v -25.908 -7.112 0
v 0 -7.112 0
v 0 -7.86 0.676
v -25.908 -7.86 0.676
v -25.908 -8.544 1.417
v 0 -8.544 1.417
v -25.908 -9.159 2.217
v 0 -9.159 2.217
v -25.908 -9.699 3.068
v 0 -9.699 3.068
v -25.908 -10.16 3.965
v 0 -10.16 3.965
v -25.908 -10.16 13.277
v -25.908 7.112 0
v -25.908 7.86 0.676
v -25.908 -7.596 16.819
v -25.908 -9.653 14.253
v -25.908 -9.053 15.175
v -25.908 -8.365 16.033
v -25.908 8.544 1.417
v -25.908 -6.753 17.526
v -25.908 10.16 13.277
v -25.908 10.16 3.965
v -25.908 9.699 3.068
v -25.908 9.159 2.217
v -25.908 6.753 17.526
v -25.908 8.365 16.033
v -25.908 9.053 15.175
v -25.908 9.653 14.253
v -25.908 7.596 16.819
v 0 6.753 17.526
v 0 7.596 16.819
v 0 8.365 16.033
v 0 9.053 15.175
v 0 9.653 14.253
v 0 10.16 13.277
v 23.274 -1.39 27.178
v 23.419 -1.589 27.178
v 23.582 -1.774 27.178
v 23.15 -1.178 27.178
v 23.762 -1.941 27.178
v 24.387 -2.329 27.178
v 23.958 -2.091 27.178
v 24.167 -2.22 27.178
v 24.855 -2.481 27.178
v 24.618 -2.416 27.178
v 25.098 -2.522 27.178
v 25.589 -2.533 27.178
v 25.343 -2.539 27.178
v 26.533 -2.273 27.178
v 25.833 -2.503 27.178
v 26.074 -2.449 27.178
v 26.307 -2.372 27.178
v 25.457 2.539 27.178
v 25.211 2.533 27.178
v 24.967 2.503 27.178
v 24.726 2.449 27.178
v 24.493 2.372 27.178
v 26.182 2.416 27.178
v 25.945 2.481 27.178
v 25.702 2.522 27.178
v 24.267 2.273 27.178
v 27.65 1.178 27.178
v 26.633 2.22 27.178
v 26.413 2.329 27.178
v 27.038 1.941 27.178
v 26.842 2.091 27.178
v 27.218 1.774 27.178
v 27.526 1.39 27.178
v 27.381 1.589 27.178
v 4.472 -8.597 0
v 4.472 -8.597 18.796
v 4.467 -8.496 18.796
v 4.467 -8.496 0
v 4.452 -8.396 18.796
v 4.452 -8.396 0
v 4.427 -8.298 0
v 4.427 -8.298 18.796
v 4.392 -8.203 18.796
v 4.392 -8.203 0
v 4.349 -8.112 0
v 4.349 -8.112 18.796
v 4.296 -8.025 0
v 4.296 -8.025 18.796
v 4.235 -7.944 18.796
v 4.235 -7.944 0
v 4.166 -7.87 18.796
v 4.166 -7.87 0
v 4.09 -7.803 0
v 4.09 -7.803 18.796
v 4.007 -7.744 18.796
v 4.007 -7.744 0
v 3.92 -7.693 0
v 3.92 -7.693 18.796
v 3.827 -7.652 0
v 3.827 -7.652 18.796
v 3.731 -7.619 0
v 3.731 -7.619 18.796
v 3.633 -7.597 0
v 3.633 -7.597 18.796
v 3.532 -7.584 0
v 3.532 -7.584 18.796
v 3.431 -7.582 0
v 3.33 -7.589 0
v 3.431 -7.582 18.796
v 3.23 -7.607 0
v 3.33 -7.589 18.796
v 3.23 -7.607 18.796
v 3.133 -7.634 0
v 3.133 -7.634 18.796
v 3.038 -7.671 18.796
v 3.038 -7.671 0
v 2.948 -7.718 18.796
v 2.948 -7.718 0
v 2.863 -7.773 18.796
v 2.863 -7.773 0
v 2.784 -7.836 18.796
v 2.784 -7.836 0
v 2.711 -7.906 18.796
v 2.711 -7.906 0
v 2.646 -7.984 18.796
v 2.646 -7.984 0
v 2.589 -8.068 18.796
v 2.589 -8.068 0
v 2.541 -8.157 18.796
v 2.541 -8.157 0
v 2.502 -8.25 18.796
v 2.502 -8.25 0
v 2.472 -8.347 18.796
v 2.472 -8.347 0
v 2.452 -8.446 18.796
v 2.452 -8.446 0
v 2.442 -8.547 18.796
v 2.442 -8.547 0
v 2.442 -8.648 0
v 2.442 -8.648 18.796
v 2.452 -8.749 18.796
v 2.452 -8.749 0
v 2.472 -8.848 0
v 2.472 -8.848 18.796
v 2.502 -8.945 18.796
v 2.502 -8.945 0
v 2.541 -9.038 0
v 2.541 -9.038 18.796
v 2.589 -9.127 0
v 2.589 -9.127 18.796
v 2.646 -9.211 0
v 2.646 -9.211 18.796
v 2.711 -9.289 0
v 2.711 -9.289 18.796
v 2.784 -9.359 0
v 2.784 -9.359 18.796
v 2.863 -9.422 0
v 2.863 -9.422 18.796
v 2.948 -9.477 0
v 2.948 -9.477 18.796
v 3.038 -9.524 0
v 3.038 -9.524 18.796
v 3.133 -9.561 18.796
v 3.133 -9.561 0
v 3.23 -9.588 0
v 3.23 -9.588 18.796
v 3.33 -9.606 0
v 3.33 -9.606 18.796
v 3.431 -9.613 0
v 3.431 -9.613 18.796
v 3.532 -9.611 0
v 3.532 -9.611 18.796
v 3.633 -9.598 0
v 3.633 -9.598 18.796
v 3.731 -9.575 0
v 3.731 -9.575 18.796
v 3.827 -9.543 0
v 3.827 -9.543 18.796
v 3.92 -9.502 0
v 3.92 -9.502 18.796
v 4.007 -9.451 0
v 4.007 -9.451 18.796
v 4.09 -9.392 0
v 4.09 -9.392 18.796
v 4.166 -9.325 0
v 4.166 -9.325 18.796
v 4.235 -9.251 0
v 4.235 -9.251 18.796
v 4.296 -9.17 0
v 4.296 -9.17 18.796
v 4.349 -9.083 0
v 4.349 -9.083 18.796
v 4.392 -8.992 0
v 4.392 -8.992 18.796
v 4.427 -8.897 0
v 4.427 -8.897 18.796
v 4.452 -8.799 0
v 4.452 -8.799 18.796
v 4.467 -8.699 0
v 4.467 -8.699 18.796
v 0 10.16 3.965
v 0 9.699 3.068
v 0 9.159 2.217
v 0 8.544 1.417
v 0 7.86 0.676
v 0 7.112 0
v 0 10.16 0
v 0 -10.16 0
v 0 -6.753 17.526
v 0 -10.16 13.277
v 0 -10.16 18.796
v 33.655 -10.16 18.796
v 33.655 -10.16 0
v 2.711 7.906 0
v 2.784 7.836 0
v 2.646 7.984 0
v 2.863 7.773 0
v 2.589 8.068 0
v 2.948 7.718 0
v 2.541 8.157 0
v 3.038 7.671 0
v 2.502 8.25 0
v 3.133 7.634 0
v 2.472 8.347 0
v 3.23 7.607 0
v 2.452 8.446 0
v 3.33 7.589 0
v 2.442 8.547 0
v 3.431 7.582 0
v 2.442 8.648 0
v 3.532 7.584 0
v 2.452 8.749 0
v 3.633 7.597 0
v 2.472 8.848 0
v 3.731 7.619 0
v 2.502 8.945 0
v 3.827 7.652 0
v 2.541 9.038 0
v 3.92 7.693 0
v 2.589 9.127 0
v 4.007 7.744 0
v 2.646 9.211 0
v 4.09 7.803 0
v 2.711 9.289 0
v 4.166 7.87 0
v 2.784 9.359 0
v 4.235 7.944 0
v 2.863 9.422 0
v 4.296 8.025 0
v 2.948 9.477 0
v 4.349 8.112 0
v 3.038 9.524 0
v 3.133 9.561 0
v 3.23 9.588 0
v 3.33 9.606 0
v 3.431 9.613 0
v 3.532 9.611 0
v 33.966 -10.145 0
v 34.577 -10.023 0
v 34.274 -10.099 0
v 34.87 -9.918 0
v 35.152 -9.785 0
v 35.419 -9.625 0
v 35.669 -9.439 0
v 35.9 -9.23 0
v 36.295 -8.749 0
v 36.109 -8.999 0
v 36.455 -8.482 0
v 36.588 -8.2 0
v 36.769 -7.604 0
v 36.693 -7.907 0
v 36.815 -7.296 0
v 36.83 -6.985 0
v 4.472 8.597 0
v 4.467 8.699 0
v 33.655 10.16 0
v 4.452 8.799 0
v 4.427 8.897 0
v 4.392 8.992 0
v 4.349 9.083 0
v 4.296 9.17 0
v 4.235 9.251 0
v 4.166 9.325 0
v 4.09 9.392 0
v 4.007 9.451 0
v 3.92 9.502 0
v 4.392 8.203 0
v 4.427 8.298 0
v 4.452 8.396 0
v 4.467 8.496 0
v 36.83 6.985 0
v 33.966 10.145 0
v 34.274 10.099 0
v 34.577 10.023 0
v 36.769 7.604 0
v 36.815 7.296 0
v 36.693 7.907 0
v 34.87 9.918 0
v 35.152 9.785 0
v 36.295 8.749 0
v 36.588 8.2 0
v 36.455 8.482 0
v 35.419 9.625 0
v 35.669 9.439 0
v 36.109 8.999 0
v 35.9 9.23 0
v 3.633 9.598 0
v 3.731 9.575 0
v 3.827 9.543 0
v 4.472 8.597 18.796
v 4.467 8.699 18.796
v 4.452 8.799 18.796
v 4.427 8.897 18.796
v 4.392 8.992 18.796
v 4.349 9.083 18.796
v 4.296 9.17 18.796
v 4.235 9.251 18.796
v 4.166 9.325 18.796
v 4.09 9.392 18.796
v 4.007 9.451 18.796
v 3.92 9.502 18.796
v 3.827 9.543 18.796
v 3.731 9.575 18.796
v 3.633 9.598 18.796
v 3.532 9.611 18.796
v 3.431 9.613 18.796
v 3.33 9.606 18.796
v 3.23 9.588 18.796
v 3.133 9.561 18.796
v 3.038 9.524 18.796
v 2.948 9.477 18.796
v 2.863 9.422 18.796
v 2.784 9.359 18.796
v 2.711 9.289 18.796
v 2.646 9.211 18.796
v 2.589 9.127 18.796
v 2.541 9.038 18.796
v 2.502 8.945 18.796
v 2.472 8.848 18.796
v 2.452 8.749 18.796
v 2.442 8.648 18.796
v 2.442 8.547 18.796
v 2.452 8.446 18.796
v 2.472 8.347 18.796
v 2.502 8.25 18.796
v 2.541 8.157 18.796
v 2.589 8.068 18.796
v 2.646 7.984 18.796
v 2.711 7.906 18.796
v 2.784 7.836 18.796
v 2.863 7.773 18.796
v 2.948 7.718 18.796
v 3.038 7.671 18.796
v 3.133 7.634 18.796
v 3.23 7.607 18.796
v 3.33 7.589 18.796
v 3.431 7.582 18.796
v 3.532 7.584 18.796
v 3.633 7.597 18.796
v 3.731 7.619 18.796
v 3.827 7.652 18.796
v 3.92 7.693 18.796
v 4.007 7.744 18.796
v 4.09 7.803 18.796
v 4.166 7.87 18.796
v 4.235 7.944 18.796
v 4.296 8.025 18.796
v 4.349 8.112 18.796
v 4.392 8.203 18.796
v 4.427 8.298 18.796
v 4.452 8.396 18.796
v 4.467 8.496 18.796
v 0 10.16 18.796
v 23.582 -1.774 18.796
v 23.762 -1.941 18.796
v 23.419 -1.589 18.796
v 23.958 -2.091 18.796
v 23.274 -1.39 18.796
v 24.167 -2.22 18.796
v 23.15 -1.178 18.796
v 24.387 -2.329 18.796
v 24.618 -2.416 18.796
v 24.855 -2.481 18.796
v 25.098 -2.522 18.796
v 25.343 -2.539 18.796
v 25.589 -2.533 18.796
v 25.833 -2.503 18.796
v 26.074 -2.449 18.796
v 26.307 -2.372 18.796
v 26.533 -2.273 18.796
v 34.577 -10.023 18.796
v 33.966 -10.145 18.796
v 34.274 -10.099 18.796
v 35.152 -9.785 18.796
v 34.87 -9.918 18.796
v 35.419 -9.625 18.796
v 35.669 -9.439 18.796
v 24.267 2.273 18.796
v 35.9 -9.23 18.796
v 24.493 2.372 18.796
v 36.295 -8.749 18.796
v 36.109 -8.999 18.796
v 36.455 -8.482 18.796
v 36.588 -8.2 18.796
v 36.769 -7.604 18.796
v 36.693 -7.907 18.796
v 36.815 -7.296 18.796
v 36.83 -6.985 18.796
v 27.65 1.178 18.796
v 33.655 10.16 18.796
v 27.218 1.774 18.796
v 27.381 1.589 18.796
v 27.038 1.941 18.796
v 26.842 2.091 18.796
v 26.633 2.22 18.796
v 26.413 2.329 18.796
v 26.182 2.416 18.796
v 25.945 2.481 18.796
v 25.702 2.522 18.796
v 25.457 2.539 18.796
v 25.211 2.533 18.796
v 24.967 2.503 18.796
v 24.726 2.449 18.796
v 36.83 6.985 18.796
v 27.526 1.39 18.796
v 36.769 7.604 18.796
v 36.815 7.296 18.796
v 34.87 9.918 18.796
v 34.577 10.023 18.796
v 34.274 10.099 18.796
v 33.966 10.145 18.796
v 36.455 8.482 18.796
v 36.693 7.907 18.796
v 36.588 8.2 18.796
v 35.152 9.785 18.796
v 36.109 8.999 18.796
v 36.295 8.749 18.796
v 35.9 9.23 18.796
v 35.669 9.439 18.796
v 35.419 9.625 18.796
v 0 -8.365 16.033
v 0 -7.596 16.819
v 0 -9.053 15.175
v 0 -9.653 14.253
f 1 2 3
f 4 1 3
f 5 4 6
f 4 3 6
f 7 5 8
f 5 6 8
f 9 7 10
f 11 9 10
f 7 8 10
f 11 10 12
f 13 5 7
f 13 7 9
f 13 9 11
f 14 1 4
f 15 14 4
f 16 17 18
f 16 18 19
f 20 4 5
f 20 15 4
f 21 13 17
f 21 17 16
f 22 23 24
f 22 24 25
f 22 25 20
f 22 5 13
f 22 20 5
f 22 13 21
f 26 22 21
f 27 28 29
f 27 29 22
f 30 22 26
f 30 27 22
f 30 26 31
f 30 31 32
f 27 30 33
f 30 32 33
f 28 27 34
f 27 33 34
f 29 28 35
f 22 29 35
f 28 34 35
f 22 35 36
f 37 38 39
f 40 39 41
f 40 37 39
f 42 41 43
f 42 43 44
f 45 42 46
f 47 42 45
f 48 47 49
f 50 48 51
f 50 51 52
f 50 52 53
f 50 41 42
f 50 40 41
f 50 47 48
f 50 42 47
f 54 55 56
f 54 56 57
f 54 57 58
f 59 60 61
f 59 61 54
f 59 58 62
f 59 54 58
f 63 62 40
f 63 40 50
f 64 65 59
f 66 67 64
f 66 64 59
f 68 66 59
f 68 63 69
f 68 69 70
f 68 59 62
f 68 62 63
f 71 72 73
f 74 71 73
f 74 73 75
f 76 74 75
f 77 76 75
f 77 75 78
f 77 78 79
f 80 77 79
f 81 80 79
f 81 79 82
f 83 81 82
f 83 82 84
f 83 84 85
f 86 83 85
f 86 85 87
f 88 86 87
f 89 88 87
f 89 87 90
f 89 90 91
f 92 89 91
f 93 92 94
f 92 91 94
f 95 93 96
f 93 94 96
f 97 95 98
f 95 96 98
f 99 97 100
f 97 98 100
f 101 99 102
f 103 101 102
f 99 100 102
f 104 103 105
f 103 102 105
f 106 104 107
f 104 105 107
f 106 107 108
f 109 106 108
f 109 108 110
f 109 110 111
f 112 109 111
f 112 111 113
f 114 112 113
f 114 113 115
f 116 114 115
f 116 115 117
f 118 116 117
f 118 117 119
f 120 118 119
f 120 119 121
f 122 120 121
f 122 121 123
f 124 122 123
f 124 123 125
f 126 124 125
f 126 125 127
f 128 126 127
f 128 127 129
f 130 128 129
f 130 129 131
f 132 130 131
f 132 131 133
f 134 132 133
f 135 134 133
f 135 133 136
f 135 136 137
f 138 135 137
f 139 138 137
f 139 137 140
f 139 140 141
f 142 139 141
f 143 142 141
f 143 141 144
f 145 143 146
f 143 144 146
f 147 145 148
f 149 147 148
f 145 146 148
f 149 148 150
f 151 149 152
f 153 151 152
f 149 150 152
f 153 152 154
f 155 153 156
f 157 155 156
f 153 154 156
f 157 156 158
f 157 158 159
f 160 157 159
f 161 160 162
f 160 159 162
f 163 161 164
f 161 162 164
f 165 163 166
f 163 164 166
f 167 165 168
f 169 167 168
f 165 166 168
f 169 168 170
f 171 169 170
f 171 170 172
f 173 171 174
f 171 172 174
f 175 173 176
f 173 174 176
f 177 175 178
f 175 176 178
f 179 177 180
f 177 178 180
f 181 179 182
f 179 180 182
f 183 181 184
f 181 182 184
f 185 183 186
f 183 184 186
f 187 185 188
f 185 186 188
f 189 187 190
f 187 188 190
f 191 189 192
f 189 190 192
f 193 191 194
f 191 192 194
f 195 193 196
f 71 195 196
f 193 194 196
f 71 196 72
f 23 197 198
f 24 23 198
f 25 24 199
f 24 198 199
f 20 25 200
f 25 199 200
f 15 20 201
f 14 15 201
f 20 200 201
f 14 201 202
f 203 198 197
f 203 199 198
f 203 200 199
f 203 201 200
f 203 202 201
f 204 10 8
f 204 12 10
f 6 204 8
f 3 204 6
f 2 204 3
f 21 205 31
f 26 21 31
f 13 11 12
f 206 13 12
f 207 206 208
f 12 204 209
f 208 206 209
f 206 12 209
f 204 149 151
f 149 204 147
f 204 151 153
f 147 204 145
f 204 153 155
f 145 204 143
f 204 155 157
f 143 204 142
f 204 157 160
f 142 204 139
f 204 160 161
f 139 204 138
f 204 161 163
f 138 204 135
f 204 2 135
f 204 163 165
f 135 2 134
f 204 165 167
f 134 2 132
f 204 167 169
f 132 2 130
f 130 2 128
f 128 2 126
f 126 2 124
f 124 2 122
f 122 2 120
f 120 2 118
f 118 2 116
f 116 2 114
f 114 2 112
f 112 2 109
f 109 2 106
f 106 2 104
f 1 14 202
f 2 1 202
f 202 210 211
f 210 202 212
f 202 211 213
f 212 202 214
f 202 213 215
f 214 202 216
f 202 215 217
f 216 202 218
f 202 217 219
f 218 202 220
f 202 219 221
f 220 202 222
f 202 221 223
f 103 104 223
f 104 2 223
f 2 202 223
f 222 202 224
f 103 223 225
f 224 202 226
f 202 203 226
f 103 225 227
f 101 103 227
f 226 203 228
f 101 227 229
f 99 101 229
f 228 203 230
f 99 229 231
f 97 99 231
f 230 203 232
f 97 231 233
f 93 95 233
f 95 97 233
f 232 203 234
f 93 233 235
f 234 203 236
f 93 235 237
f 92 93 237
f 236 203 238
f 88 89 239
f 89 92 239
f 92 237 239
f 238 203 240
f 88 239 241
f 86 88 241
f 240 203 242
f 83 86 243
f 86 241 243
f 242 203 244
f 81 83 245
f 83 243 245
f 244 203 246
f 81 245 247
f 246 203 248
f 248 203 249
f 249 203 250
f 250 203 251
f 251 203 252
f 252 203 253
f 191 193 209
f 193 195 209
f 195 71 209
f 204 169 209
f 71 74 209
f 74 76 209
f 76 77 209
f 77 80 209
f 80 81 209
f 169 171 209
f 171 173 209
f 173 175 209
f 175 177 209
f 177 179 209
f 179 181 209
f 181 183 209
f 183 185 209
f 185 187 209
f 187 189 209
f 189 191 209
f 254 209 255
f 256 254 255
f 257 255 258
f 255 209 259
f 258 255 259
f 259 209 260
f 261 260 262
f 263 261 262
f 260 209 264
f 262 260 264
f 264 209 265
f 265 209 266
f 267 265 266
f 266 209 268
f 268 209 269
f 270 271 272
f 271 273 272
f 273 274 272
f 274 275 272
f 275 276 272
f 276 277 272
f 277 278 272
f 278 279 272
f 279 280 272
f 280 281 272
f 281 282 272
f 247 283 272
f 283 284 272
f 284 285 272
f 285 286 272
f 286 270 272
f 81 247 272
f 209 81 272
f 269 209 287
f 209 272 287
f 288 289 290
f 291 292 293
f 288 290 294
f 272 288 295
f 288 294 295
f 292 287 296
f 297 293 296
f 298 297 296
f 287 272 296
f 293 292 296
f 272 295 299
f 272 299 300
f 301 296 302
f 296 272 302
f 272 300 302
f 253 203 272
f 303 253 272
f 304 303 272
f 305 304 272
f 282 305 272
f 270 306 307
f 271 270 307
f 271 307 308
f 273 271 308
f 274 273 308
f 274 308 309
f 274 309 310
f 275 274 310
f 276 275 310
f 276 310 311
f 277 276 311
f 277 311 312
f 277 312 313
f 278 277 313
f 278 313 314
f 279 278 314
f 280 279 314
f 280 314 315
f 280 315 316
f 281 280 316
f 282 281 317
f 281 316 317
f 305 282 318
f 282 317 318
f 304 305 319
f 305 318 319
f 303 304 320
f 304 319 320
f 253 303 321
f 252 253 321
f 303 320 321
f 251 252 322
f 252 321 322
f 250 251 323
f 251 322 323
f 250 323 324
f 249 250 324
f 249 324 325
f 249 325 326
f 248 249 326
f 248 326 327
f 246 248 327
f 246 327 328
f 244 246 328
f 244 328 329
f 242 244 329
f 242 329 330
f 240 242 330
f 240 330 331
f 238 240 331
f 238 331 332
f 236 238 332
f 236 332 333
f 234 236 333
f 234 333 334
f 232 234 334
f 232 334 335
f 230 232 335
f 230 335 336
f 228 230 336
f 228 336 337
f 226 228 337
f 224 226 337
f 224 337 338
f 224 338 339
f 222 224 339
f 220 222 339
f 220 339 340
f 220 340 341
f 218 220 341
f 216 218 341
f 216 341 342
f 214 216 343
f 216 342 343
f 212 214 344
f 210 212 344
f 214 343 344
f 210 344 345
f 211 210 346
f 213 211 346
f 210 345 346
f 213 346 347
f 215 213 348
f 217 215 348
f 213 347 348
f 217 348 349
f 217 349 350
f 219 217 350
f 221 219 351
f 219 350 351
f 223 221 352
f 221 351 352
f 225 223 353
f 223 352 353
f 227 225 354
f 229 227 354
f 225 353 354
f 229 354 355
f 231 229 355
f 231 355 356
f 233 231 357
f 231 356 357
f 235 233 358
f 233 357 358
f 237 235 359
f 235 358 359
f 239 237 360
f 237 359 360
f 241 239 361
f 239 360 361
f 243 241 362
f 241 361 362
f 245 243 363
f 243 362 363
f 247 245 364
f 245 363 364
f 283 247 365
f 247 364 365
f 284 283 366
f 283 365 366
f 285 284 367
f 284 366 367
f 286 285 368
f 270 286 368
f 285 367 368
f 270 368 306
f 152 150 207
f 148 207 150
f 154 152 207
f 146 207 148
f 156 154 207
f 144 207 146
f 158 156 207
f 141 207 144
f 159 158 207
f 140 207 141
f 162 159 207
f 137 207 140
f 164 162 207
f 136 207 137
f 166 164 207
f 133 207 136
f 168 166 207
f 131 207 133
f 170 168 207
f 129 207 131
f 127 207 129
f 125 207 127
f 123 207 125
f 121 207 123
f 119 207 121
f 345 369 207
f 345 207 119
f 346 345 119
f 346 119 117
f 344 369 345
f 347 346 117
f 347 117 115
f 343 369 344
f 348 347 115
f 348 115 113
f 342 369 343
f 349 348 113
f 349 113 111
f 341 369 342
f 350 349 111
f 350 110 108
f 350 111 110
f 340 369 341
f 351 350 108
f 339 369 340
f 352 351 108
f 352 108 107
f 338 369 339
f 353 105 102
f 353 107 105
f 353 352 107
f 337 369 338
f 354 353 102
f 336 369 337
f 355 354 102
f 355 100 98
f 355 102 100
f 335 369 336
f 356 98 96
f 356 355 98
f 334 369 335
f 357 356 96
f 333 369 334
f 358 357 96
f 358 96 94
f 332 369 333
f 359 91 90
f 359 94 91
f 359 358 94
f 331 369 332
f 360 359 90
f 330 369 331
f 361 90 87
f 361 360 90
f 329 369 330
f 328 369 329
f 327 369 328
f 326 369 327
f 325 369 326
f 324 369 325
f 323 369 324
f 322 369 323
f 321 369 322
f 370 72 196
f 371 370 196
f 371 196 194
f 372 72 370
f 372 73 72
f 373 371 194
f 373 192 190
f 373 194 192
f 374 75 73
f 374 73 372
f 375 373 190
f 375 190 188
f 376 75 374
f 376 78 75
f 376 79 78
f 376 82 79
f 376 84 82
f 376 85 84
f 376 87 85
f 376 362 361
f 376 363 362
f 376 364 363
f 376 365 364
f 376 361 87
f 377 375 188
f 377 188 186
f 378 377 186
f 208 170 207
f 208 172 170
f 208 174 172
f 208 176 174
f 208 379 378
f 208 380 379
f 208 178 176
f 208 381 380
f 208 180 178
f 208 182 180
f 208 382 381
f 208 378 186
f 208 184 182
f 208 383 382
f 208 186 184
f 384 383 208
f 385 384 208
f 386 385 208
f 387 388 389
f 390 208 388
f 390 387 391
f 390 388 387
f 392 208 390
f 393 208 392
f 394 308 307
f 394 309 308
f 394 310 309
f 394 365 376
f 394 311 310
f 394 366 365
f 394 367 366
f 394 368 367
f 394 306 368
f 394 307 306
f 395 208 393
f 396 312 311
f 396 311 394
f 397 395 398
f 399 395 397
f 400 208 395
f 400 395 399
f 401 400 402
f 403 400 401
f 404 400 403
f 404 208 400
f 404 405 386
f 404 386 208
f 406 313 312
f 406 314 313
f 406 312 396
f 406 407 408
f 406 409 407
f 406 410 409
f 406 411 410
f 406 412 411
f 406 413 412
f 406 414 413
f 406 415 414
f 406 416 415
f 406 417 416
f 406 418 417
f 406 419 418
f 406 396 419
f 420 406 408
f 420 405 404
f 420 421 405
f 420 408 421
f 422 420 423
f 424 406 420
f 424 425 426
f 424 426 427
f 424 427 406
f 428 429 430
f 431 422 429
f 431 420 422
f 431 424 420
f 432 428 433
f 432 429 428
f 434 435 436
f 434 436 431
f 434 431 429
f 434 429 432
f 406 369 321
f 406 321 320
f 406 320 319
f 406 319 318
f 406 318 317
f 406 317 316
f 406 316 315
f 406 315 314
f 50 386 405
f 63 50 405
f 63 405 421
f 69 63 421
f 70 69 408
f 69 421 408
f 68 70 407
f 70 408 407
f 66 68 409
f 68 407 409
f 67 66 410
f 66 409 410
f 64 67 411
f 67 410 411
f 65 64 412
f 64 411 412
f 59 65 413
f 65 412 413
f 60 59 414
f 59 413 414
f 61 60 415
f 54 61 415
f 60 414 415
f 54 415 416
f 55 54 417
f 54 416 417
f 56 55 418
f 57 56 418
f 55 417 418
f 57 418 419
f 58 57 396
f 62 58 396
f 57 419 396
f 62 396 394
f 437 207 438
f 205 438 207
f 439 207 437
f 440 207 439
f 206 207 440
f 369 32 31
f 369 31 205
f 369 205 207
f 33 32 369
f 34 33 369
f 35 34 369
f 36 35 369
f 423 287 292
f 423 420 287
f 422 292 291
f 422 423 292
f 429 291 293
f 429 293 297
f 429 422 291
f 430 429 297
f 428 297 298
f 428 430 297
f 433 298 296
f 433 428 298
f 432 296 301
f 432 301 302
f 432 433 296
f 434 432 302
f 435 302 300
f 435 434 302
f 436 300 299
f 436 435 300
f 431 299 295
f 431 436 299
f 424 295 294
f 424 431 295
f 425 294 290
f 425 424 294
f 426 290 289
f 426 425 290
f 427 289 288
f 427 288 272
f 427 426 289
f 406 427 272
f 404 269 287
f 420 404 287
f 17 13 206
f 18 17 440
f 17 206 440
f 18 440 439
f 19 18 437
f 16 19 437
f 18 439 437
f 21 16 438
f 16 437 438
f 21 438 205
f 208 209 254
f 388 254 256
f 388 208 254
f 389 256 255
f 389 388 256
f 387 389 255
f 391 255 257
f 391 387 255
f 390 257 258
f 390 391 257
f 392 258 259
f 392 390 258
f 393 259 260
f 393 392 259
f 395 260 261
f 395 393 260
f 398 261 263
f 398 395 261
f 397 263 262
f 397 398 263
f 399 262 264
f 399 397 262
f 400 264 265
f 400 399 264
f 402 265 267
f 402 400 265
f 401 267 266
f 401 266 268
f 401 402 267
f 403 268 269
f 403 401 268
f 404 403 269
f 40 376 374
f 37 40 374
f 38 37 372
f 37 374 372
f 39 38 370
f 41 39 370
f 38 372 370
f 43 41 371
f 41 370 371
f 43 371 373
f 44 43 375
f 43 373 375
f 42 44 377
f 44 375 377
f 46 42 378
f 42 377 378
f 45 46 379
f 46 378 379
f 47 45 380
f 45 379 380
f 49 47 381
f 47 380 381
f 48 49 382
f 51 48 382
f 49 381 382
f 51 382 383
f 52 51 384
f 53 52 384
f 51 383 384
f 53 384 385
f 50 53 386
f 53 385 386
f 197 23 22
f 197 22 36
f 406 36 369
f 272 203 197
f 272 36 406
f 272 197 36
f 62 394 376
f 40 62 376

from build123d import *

# Parameters (mm, degrees)
SKETCH1_W           = 36.83
SKETCH1_H           = 20.32
BOSS_EXTRUDE1_DEPTH = 18.796
FILLET1_R           = 3.175
BOSS_EXTRUDE2_DEPTH = 25.908
BOSS_EXTRUDE3_DEPTH = 8.382
SKETCH4_R           = 1.016
CUT_EXTRUDE1_DEPTH  = 19.796


with BuildPart() as part:
    # Sketch1 → Boss-Extrude1 (new body)
    with BuildSketch(Plane.XY):
        with Locations((18.415, 0)):
            Rectangle(SKETCH1_W, SKETCH1_H)
    extrude(amount=BOSS_EXTRUDE1_DEPTH)

    # Fillet1
    fillet1_edges = [part.edges().sort_by_distance(p)[0] for p in [
        (36.83, 10.16, 9.398),
        (36.83, -10.16, 9.398),
    ]]
    fillet(fillet1_edges, radius=FILLET1_R)

    # Sketch2 → Boss-Extrude2 (add)
    with BuildSketch(Plane.ZY):
        with BuildLine():
            ThreePointArc((3.96514897, 10.16), (1.809887501, 8.860648824), (0, 7.112))
            Line((0, 7.112), (0, -7.112))
            ThreePointArc((0, -7.112), (1.809887501, -8.860648824), (3.96514897, -10.16))
            Line((3.96514897, -10.16), (13.276942782, -10.16))
            ThreePointArc((13.276942782, -10.16), (15.61217315, -8.719352926), (17.526, -6.753130241))
            Line((17.526, -6.753130241), (17.526, 6.753130241))
            ThreePointArc((17.526, 6.753130241), (15.61217315, 8.719352926), (13.276942782, 10.16))
            Line((13.276942782, 10.16), (3.96514897, 10.16))
        make_face()
    extrude(amount=BOSS_EXTRUDE2_DEPTH)

    # Sketch3 → Boss-Extrude3 (add)
    with BuildSketch(Plane.XY.offset(18.796)):
        with BuildLine():
            Line((24.267261803, 2.273434446), (23.149675051, -1.177980315))
            ThreePointArc((23.149675051, -1.177980315), (24.617532764, -2.416473676), (26.532738197, -2.273434446))
            Line((26.532738197, -2.273434446), (27.650324949, 1.177980315))
            ThreePointArc((27.650324949, 1.177980315), (26.182467236, 2.416473676), (24.267261803, 2.273434446))
        make_face()
    extrude(amount=BOSS_EXTRUDE3_DEPTH)

    # Sketch4 → Cut-Extrude1 (cut, through all)
    with BuildSketch(Plane.XY.offset(18.796)):
        with Locations((3.456249115, 8.597457961)):
            Circle(SKETCH4_R)
        with Locations((3.456249115, -8.597457961)):
            Circle(SKETCH4_R)
    extrude(amount=-CUT_EXTRUDE1_DEPTH, mode=Mode.SUBTRACT)


solid = part.part
